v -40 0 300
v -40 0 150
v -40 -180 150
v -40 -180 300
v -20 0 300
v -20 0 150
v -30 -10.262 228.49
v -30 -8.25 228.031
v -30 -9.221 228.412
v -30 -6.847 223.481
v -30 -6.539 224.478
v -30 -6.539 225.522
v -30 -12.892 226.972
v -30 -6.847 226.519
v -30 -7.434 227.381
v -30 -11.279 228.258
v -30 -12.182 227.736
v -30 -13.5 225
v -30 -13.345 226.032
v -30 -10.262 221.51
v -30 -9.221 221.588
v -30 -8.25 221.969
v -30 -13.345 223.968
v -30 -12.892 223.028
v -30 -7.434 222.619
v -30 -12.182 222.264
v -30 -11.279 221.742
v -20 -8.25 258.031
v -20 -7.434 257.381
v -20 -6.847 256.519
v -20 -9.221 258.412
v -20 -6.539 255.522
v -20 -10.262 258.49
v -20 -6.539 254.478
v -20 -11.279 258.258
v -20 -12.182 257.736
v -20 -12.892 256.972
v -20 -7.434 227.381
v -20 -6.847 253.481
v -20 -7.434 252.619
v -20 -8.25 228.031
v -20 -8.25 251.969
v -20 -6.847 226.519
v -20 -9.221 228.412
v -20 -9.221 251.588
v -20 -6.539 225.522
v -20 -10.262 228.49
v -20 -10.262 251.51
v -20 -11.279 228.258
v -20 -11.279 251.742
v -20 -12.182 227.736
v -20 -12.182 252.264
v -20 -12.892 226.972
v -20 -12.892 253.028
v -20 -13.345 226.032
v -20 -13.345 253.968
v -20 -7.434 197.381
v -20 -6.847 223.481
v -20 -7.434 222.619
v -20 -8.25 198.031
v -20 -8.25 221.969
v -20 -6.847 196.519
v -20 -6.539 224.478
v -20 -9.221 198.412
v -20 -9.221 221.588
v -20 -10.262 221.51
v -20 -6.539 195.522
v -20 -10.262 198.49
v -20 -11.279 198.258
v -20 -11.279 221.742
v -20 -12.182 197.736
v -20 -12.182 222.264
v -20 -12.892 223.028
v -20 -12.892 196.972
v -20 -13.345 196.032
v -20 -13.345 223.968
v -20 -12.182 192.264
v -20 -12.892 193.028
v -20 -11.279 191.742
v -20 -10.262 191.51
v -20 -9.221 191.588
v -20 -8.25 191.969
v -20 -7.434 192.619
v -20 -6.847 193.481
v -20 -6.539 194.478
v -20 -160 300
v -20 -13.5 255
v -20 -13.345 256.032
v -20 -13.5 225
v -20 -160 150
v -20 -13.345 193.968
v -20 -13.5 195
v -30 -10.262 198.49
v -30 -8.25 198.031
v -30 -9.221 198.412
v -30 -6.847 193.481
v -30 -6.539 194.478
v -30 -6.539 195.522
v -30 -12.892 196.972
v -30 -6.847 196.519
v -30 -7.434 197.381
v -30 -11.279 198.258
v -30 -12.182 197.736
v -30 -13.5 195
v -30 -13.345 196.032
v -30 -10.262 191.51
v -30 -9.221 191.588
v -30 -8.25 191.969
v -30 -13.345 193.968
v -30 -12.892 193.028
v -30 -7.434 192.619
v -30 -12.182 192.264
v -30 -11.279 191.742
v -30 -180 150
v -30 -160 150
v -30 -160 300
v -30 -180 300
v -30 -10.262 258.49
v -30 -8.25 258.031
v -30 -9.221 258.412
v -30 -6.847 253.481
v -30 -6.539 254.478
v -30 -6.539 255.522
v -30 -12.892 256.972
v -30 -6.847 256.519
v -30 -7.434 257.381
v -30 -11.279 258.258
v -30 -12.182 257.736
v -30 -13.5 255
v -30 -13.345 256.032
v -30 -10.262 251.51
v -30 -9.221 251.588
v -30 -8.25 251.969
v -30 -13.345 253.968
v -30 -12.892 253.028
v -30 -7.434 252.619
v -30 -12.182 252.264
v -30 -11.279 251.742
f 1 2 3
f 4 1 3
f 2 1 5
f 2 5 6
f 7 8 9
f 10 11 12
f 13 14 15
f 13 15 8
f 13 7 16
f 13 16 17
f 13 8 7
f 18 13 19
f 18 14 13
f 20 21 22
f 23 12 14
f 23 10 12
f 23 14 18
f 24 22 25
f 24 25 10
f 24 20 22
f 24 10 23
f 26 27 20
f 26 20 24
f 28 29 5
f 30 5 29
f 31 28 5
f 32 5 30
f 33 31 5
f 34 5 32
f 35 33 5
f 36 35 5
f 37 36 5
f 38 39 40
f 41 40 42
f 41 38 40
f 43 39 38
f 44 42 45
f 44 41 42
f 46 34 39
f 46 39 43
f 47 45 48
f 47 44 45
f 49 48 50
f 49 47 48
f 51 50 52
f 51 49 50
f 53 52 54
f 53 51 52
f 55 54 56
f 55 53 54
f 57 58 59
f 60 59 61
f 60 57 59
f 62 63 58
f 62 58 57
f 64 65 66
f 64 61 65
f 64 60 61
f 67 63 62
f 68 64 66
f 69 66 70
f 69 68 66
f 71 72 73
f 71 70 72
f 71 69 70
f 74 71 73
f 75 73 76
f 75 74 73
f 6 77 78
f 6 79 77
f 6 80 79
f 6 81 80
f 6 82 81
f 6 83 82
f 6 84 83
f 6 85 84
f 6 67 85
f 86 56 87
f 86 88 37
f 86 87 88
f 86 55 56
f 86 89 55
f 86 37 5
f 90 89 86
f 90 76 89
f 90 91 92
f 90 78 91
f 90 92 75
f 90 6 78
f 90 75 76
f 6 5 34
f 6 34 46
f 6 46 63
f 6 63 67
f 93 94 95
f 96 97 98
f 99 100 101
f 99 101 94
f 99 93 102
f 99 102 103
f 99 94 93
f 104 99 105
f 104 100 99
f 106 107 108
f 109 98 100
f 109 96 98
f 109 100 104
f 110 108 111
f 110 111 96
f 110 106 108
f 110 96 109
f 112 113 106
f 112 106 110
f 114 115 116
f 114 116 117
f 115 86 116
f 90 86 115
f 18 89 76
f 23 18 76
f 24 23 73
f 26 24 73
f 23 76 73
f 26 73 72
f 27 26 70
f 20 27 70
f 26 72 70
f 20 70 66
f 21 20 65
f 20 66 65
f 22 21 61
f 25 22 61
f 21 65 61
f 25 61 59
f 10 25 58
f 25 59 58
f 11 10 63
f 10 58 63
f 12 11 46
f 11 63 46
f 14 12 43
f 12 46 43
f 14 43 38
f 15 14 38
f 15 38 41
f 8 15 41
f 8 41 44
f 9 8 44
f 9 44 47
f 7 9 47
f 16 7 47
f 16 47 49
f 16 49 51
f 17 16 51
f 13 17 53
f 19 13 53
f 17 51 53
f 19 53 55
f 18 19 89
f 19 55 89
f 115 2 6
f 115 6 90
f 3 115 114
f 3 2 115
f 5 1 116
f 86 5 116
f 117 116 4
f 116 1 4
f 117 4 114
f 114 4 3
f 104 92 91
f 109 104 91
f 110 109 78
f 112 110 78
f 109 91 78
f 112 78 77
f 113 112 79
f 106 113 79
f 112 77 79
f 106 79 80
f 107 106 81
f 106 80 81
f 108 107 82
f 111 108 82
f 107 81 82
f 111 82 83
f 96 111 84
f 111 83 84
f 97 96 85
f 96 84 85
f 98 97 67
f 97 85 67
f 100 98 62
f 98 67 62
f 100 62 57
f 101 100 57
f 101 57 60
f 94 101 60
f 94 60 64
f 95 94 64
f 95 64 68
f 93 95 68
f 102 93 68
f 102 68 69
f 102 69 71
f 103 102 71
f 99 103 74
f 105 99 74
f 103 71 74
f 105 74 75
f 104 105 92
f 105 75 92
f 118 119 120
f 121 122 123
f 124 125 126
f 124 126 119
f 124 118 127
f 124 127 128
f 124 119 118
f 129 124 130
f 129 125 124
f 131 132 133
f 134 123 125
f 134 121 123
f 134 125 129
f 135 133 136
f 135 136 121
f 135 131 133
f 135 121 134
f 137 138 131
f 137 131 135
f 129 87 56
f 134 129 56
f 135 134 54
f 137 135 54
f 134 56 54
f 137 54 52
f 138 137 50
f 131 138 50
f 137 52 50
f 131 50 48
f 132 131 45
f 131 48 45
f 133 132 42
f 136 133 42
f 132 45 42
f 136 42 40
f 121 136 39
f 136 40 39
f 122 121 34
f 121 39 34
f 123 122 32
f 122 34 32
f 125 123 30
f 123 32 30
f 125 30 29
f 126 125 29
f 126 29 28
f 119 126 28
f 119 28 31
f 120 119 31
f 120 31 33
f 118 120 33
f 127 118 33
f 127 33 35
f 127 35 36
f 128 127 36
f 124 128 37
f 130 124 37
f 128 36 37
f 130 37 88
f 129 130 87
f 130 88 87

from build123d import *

# Parameters (mm, degrees)
F0_W     = 180
F0_H     = 150
F1_DEPTH = 20
F2_R     = 3.5
F3_DEPTH = 10
F4_W     = 20
F4_H     = 150
F5_DEPTH = 10
F6_ANGLE = 180
F7_ANGLE = -90
F8_ANGLE = 180


with BuildPart() as f1:
    # F0 (on Front) → F1 (new body)
    with BuildSketch(Plane.XZ):
        with Locations((90, 75)):
            Rectangle(F0_W, F0_H)
    extrude(amount=F1_DEPTH)

    # F2 (on face) → F3 (cut)
    with BuildSketch(Plane.XZ.offset(20)):
        with Locations((10, 75)):
            Circle(F2_R)
        with Locations((10, 105)):
            Circle(F2_R)
        with Locations((10, 45)):
            Circle(F2_R)
    extrude(amount=-F3_DEPTH, mode=Mode.SUBTRACT)

    # F4 (on face) → F5 (cut)
    with BuildSketch(Plane.XZ.offset(20)):
        with Locations((170, 75)):
            Rectangle(F4_W, F4_H)
    extrude(amount=-F5_DEPTH, mode=Mode.SUBTRACT)


with BuildPart() as f1_1:
    # F6: moved
    add(f1.part.rotate(Axis((90, 0, 150), (1, 0, 0)), F6_ANGLE))


with BuildPart() as f1_2:
    # F7: moved
    add(f1_1.part.rotate(Axis((0, 0, 225), (0, 0, -1)), F7_ANGLE))


with BuildPart() as f1_3:
    # F8: moved
    add(f1_2.part.rotate(Axis((-20, 0, 225), (0, 0, -1)), F8_ANGLE))


solid = f1_3.part
